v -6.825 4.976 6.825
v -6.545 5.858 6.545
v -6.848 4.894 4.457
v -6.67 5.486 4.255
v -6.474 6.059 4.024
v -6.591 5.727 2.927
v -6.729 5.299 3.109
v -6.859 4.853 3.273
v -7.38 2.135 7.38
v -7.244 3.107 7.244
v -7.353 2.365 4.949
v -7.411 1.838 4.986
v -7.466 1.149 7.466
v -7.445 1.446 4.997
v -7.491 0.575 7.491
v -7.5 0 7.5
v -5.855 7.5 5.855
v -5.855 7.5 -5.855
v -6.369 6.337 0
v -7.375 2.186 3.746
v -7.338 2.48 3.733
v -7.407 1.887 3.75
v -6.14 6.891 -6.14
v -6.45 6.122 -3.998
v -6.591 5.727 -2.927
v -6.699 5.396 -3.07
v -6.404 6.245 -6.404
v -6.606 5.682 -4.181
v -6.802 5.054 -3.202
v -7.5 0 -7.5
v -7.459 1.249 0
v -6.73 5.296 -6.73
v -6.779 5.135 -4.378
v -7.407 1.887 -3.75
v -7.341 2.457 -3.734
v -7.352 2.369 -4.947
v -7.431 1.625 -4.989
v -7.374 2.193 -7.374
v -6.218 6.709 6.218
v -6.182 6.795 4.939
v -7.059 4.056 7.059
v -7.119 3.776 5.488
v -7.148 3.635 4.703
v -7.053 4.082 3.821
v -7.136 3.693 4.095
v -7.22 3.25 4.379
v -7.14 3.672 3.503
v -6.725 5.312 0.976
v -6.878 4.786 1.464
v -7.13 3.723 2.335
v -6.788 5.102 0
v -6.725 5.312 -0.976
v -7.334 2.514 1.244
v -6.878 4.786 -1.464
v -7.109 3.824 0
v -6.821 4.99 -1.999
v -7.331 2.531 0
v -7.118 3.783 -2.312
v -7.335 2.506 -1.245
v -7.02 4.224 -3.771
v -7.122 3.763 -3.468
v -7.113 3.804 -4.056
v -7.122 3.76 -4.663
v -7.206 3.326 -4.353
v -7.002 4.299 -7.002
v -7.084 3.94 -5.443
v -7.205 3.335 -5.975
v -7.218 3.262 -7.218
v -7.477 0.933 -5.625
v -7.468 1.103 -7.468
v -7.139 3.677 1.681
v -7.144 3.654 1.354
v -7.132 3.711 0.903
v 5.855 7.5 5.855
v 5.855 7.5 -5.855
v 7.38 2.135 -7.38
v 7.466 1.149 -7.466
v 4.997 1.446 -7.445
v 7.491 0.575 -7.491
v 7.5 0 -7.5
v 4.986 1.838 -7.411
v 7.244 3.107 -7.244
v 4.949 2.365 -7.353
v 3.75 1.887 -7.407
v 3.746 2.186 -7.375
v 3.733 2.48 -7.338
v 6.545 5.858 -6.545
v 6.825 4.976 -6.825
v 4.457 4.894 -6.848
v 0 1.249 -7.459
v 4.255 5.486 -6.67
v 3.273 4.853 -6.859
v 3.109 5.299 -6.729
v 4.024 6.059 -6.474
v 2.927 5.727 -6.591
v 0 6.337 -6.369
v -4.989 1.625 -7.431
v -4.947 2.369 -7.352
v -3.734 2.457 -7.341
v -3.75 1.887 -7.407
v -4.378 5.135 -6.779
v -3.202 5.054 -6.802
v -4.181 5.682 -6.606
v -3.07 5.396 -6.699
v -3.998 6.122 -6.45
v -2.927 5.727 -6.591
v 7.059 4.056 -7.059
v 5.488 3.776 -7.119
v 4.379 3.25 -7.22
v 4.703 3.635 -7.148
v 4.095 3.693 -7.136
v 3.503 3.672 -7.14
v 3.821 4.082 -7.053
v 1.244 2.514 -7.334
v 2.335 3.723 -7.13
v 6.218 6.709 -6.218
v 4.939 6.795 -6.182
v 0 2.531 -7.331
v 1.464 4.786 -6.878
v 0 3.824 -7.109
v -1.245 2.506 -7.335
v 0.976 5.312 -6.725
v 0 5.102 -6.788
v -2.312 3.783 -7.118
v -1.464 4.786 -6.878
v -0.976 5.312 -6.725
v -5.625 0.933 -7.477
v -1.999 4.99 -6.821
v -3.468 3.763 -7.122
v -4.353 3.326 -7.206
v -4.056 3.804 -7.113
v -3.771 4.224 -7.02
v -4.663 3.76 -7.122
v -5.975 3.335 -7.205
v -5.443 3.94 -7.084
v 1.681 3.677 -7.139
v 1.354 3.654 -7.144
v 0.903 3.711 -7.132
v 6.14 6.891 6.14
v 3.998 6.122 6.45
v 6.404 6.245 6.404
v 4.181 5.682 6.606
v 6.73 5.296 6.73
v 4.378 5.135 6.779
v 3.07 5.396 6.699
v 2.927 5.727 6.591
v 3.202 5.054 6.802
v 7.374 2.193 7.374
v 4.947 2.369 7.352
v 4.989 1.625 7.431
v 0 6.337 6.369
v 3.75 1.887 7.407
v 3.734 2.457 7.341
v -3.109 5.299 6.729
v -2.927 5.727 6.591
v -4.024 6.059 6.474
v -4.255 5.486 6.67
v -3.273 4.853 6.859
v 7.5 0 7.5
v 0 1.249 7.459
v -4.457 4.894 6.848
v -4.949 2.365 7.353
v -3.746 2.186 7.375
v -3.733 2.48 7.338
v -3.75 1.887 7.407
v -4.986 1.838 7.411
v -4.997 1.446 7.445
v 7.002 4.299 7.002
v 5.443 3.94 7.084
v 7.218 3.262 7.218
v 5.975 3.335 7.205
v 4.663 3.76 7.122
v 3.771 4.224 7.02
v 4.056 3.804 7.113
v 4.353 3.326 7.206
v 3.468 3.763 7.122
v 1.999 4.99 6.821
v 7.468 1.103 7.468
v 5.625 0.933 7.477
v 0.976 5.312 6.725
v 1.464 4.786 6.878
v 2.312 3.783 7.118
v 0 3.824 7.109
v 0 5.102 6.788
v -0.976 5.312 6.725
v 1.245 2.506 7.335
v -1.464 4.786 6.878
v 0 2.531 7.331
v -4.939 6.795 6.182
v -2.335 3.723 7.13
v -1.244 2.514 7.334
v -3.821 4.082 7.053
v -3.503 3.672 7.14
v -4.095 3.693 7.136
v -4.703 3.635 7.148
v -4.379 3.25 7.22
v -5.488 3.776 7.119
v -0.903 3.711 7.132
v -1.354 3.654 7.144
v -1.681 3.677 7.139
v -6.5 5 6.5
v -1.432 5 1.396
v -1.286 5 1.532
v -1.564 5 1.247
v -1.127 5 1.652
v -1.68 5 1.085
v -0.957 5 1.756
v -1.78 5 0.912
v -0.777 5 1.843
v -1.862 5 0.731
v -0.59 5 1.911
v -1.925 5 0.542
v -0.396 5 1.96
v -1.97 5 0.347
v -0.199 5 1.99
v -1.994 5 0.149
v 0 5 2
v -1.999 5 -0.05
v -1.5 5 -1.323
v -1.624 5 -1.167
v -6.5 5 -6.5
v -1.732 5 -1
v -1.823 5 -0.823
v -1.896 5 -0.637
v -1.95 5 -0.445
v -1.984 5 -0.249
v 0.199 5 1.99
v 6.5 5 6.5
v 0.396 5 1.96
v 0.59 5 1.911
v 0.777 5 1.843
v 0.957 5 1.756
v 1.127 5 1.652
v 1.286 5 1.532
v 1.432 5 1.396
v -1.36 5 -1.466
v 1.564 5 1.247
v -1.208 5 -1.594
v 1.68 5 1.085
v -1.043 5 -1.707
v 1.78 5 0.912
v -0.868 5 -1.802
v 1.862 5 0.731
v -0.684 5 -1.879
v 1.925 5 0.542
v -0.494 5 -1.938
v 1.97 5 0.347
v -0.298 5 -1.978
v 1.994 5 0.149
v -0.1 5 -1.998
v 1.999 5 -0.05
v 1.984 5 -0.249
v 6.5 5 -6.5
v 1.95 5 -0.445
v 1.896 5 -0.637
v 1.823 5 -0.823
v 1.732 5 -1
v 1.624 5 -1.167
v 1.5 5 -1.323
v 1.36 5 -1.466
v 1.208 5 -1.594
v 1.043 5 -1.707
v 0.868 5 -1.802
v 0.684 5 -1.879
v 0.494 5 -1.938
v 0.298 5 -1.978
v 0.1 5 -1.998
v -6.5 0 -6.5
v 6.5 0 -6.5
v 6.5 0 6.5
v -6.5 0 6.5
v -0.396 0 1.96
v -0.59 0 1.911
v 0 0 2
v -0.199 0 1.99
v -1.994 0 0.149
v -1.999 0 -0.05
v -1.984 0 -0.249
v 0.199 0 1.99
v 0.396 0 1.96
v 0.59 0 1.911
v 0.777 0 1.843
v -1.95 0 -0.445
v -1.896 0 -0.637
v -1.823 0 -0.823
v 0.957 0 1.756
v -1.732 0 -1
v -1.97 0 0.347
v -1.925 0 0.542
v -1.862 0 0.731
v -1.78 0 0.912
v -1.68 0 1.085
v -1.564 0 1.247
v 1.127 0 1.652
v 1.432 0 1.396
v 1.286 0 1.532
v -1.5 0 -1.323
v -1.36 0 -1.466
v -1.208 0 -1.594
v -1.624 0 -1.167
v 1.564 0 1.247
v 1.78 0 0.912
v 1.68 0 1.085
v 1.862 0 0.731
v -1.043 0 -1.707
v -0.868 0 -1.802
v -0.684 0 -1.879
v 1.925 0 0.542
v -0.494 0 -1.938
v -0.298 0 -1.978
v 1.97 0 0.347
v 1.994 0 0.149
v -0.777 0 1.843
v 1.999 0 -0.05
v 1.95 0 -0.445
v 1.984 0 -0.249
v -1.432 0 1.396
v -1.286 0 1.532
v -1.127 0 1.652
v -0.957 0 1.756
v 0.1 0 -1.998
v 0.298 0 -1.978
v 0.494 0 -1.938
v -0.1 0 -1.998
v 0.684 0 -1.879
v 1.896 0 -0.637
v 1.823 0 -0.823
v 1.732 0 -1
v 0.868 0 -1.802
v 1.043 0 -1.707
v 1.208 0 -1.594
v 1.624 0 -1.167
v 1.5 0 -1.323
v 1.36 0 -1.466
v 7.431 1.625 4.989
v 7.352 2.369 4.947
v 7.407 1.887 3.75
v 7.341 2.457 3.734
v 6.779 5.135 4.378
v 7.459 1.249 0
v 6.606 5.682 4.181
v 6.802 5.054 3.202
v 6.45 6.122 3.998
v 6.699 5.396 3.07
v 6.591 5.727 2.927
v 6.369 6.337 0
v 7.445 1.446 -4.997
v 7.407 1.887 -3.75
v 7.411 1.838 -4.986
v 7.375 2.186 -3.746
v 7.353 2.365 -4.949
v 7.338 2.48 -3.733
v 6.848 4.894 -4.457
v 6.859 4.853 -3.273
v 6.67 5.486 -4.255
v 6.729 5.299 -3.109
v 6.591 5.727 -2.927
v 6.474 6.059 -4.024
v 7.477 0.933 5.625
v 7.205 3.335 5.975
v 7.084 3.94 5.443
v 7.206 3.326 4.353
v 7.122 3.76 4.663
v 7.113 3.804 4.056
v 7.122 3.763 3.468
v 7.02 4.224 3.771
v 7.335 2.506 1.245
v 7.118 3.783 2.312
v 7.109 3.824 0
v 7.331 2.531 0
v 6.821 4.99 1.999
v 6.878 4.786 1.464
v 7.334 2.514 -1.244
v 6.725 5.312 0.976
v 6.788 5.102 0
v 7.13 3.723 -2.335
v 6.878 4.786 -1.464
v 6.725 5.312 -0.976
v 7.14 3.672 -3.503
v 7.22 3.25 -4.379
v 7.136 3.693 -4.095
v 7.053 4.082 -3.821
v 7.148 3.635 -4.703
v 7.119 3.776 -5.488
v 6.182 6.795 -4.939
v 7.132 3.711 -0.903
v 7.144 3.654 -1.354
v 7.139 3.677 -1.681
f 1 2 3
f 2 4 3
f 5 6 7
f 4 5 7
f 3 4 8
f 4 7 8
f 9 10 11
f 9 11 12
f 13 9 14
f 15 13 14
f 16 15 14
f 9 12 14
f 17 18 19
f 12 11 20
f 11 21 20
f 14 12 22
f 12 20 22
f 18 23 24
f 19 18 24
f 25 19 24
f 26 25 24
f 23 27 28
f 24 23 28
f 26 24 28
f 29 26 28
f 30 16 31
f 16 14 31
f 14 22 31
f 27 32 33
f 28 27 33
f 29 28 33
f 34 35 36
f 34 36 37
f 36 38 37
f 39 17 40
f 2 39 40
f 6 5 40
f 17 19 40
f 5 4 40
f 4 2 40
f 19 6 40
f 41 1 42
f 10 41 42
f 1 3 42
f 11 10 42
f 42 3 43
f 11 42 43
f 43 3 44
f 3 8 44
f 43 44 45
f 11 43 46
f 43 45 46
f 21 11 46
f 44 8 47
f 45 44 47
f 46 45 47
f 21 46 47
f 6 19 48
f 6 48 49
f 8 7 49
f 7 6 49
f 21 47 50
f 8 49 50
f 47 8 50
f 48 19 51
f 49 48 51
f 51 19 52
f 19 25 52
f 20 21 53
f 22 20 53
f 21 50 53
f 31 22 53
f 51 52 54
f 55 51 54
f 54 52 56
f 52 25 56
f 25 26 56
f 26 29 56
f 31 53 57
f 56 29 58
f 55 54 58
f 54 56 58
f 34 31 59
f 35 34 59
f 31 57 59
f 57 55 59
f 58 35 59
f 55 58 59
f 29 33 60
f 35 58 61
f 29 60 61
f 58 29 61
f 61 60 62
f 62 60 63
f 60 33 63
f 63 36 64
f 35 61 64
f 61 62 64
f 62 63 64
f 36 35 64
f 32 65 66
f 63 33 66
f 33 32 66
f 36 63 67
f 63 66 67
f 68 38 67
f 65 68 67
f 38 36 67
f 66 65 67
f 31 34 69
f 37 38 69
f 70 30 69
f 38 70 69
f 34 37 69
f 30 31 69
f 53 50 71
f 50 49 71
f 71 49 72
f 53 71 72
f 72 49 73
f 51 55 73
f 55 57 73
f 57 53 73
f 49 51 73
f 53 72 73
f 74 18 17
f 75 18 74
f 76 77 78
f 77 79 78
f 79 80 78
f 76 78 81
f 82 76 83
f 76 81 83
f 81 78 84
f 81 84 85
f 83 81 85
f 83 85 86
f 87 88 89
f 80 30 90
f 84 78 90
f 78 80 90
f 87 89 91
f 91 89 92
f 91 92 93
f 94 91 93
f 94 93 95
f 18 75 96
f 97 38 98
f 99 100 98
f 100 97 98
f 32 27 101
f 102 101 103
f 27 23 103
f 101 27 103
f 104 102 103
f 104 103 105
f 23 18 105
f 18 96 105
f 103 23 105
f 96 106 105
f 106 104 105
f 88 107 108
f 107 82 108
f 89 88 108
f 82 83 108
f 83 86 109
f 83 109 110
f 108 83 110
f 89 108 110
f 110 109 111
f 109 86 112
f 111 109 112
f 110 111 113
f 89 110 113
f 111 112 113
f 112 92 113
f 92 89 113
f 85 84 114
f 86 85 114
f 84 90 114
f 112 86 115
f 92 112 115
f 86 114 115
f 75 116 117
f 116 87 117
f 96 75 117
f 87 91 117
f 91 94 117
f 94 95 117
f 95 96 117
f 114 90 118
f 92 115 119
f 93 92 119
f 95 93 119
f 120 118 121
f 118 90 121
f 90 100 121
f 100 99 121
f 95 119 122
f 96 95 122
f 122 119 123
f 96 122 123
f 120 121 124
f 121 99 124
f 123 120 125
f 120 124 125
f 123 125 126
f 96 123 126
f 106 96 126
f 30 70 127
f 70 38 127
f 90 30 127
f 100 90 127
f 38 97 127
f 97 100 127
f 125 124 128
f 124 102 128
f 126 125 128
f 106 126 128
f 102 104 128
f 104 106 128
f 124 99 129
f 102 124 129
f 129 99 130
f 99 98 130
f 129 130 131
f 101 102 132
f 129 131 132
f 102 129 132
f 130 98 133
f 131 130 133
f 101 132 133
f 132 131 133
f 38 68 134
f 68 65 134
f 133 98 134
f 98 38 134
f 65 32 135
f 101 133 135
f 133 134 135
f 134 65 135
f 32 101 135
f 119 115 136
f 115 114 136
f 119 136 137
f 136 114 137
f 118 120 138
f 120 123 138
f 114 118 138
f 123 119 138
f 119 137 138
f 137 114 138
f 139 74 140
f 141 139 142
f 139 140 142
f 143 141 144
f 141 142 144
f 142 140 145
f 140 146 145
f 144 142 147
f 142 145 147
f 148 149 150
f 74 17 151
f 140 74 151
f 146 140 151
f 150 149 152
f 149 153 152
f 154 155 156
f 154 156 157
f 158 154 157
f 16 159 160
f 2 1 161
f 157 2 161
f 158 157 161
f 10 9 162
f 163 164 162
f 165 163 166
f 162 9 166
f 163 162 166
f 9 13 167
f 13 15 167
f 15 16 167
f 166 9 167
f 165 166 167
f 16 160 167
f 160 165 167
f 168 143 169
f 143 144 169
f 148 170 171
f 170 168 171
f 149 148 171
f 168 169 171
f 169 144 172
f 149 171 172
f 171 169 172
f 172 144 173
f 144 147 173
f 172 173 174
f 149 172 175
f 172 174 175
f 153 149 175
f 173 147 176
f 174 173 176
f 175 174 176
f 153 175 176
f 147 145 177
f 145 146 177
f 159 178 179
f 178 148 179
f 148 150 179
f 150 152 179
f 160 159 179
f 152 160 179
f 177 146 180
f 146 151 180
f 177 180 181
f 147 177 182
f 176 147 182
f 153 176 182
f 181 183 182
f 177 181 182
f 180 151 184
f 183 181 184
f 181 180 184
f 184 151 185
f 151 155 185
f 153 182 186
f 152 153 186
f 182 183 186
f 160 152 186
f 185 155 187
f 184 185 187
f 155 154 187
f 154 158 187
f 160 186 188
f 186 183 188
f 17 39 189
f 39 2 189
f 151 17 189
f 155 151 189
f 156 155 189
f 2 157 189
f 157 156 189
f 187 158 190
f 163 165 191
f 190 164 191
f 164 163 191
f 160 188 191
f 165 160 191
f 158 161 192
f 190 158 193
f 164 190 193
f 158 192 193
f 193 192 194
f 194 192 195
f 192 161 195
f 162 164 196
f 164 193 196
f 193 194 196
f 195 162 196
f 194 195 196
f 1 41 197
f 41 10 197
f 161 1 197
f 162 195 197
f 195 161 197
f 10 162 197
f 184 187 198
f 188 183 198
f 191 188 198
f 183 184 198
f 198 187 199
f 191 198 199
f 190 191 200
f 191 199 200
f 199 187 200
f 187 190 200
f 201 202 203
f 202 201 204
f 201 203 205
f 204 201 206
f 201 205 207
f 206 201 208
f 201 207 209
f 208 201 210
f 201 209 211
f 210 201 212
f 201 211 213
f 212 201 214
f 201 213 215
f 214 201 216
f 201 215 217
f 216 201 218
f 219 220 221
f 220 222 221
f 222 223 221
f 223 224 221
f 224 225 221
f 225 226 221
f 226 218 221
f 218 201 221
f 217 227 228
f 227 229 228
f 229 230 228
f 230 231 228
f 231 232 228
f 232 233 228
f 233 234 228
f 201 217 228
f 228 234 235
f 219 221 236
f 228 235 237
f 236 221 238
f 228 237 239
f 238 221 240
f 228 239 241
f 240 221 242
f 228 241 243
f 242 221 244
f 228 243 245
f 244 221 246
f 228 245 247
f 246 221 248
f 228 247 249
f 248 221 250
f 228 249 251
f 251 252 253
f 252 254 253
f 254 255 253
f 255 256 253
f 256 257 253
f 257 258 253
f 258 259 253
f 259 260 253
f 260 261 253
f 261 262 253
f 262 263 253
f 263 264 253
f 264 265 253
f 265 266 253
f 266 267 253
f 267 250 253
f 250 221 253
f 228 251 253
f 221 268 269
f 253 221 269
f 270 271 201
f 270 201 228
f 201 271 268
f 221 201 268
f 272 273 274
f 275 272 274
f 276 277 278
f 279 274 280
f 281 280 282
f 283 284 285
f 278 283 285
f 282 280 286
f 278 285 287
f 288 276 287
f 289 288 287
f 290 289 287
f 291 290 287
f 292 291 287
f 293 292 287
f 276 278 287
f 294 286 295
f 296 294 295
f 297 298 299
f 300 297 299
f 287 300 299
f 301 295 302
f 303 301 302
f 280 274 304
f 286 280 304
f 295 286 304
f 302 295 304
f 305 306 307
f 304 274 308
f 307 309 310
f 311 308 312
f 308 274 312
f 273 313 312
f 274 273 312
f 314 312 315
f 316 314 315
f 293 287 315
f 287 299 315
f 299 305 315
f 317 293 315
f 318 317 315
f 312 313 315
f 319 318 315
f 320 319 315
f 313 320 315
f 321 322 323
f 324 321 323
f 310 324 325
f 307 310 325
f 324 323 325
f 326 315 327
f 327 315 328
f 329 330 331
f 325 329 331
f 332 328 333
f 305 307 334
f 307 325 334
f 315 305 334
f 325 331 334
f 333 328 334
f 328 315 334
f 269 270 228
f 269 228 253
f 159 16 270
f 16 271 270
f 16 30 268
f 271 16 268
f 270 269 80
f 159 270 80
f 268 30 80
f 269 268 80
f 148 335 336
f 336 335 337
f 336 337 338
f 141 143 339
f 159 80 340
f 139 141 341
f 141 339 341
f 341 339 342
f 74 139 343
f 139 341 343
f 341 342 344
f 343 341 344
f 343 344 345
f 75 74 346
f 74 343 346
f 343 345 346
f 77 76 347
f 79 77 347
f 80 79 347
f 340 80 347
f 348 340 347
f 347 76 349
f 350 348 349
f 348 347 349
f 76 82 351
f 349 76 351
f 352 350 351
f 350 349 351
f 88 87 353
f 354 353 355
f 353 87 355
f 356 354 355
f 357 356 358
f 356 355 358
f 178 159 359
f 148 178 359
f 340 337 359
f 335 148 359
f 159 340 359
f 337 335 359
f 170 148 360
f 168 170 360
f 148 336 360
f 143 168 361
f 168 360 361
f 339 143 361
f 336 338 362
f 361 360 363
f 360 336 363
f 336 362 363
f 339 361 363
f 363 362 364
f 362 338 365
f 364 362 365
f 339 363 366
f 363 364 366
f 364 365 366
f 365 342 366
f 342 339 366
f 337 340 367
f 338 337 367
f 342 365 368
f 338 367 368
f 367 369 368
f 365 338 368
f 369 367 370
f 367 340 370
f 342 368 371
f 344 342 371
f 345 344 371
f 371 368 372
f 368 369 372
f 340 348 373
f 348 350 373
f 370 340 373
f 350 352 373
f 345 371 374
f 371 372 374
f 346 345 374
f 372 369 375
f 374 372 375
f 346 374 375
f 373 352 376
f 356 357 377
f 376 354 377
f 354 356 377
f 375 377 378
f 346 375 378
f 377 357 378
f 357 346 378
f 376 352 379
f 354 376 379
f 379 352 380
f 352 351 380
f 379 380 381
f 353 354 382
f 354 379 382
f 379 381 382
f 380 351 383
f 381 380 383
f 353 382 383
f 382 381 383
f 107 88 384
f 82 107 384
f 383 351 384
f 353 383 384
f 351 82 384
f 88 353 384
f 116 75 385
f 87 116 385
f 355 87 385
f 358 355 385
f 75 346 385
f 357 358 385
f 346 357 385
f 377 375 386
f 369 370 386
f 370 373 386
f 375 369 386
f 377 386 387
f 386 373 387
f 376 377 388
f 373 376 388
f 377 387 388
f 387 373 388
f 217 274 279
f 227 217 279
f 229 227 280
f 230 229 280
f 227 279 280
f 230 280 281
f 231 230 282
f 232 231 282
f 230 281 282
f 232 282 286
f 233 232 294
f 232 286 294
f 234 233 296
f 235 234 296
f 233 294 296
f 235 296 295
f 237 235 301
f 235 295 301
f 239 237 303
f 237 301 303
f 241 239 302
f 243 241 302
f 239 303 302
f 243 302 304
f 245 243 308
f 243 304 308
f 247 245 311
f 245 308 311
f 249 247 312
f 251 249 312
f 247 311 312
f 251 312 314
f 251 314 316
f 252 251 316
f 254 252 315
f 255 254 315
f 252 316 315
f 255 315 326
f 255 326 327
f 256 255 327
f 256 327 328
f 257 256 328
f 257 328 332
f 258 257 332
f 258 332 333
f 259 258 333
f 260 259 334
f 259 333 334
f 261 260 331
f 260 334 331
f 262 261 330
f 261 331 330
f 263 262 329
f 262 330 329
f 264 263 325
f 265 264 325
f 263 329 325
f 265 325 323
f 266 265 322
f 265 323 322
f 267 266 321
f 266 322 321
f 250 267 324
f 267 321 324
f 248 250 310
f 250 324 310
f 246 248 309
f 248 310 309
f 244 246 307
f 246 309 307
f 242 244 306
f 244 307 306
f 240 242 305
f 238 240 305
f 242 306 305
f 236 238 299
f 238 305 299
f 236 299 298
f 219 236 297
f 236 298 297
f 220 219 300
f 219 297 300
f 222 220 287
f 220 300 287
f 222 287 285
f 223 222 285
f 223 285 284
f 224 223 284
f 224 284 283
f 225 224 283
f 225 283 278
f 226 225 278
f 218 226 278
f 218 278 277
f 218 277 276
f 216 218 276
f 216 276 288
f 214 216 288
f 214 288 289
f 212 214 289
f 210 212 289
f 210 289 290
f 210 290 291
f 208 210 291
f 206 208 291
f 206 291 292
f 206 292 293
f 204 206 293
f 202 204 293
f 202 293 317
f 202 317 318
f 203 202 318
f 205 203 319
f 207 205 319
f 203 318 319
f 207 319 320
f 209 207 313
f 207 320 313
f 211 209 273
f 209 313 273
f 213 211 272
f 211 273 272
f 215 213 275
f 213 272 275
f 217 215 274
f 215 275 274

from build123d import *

# Parameters (mm, degrees)
SKETCH1_W               = 15
SKETCH1_H               = 15
BOSS_EXTRUDE1_DEPTH     = 7.5
CUT_EXTRUDE1_DEPTH      = 13.990381057
CUT_EXTRUDE1_DEPTH_BACK = 13.990381057
CUT_EXTRUDE2_DEPTH      = 13.99038123
CUT_EXTRUDE2_DEPTH_BACK = 13.99038123
SKETCH1_3_W             = 13
SKETCH1_3_H             = 13
SKETCH1_3_R             = 2
CUT_EXTRUDE3_DEPTH      = 5


with BuildPart() as part:
    # Sketch1 → Boss-Extrude1 (new body)
    with BuildSketch(Plane(origin=(0, 0, 0), x_dir=(1, 0, 0), z_dir=(0, 1, 0))):
        Rectangle(SKETCH1_W, SKETCH1_H)
    extrude(amount=BOSS_EXTRUDE1_DEPTH)

    # Sketch2 → Cut-Extrude1 (cut, two sides: drawn at the far end of the back side and taken through both)
    with BuildSketch(Plane.XY.offset(-CUT_EXTRUDE1_DEPTH_BACK)):
        with BuildLine():
            Line((-10, 12), (-10, 0))
            Line((-10, 0), (-7.5, 0))
            add(Edge.make_bspline(
                [(0, 12), (-7.5, 12), (-7.5, 0)],
                knots=[0, 0, 0, 1.570796327, 1.570796327, 1.570796327], degree=2, weights=[1, 0.707106781, 1]))
            Line((0, 12), (-10, 12))
        make_face()
        with BuildLine():
            add(Edge.make_bspline(
                [(7.5, 0), (7.5, 12), (0, 12)],
                knots=[4.71238898, 4.71238898, 4.71238898, 6.283185307, 6.283185307, 6.283185307], degree=2, weights=[1, 0.707106781, 1]))
            Line((7.5, 0), (10, 0))
            Line((10, 0), (10, 12))
            Line((10, 12), (0, 12))
        make_face()
    extrude(amount=CUT_EXTRUDE1_DEPTH + CUT_EXTRUDE1_DEPTH_BACK, mode=Mode.SUBTRACT)

    # Sketch3 → Cut-Extrude2 (cut, two sides: drawn at the far end of the back side and taken through both)
    with BuildSketch(Plane(origin=(0, 0, 0), x_dir=(0, 0, -1), z_dir=(1, 0, 0)).offset(-CUT_EXTRUDE2_DEPTH_BACK)):
        with BuildLine():
            Line((7.5, 0), (10, 0))
            Line((10, 0), (10, 12))
            Line((10, 12), (0, 12))
            add(Edge.make_bspline(
                [(7.5, 0), (7.5, 12), (0, 12)],
                knots=[1.570796327, 1.570796327, 1.570796327, 3.141592654, 3.141592654, 3.141592654], degree=2, weights=[1, 0.707106781, 1]))
        make_face()
        with BuildLine():
            Line((-10, 0), (-7.5, 0))
            add(Edge.make_bspline(
                [(0, 12), (-7.5, 12), (-7.5, 0)],
                knots=[3.141592654, 3.141592654, 3.141592654, 4.71238898, 4.71238898, 4.71238898], degree=2, weights=[1, 0.707106781, 1]))
            Line((0, 12), (-10, 12))
            Line((-10, 12), (-10, 0))
        make_face()
    extrude(amount=CUT_EXTRUDE2_DEPTH + CUT_EXTRUDE2_DEPTH_BACK, mode=Mode.SUBTRACT)

    # Sketch1<3> → Cut-Extrude3 (cut)
    with BuildSketch(Plane(origin=(0, 0, 0), x_dir=(1, 0, 0), z_dir=(0, 1, 0))):
        Rectangle(SKETCH1_3_W, SKETCH1_3_H)
        Circle(SKETCH1_3_R, mode=Mode.SUBTRACT)
    extrude(amount=CUT_EXTRUDE3_DEPTH, mode=Mode.SUBTRACT)


solid = part.part
